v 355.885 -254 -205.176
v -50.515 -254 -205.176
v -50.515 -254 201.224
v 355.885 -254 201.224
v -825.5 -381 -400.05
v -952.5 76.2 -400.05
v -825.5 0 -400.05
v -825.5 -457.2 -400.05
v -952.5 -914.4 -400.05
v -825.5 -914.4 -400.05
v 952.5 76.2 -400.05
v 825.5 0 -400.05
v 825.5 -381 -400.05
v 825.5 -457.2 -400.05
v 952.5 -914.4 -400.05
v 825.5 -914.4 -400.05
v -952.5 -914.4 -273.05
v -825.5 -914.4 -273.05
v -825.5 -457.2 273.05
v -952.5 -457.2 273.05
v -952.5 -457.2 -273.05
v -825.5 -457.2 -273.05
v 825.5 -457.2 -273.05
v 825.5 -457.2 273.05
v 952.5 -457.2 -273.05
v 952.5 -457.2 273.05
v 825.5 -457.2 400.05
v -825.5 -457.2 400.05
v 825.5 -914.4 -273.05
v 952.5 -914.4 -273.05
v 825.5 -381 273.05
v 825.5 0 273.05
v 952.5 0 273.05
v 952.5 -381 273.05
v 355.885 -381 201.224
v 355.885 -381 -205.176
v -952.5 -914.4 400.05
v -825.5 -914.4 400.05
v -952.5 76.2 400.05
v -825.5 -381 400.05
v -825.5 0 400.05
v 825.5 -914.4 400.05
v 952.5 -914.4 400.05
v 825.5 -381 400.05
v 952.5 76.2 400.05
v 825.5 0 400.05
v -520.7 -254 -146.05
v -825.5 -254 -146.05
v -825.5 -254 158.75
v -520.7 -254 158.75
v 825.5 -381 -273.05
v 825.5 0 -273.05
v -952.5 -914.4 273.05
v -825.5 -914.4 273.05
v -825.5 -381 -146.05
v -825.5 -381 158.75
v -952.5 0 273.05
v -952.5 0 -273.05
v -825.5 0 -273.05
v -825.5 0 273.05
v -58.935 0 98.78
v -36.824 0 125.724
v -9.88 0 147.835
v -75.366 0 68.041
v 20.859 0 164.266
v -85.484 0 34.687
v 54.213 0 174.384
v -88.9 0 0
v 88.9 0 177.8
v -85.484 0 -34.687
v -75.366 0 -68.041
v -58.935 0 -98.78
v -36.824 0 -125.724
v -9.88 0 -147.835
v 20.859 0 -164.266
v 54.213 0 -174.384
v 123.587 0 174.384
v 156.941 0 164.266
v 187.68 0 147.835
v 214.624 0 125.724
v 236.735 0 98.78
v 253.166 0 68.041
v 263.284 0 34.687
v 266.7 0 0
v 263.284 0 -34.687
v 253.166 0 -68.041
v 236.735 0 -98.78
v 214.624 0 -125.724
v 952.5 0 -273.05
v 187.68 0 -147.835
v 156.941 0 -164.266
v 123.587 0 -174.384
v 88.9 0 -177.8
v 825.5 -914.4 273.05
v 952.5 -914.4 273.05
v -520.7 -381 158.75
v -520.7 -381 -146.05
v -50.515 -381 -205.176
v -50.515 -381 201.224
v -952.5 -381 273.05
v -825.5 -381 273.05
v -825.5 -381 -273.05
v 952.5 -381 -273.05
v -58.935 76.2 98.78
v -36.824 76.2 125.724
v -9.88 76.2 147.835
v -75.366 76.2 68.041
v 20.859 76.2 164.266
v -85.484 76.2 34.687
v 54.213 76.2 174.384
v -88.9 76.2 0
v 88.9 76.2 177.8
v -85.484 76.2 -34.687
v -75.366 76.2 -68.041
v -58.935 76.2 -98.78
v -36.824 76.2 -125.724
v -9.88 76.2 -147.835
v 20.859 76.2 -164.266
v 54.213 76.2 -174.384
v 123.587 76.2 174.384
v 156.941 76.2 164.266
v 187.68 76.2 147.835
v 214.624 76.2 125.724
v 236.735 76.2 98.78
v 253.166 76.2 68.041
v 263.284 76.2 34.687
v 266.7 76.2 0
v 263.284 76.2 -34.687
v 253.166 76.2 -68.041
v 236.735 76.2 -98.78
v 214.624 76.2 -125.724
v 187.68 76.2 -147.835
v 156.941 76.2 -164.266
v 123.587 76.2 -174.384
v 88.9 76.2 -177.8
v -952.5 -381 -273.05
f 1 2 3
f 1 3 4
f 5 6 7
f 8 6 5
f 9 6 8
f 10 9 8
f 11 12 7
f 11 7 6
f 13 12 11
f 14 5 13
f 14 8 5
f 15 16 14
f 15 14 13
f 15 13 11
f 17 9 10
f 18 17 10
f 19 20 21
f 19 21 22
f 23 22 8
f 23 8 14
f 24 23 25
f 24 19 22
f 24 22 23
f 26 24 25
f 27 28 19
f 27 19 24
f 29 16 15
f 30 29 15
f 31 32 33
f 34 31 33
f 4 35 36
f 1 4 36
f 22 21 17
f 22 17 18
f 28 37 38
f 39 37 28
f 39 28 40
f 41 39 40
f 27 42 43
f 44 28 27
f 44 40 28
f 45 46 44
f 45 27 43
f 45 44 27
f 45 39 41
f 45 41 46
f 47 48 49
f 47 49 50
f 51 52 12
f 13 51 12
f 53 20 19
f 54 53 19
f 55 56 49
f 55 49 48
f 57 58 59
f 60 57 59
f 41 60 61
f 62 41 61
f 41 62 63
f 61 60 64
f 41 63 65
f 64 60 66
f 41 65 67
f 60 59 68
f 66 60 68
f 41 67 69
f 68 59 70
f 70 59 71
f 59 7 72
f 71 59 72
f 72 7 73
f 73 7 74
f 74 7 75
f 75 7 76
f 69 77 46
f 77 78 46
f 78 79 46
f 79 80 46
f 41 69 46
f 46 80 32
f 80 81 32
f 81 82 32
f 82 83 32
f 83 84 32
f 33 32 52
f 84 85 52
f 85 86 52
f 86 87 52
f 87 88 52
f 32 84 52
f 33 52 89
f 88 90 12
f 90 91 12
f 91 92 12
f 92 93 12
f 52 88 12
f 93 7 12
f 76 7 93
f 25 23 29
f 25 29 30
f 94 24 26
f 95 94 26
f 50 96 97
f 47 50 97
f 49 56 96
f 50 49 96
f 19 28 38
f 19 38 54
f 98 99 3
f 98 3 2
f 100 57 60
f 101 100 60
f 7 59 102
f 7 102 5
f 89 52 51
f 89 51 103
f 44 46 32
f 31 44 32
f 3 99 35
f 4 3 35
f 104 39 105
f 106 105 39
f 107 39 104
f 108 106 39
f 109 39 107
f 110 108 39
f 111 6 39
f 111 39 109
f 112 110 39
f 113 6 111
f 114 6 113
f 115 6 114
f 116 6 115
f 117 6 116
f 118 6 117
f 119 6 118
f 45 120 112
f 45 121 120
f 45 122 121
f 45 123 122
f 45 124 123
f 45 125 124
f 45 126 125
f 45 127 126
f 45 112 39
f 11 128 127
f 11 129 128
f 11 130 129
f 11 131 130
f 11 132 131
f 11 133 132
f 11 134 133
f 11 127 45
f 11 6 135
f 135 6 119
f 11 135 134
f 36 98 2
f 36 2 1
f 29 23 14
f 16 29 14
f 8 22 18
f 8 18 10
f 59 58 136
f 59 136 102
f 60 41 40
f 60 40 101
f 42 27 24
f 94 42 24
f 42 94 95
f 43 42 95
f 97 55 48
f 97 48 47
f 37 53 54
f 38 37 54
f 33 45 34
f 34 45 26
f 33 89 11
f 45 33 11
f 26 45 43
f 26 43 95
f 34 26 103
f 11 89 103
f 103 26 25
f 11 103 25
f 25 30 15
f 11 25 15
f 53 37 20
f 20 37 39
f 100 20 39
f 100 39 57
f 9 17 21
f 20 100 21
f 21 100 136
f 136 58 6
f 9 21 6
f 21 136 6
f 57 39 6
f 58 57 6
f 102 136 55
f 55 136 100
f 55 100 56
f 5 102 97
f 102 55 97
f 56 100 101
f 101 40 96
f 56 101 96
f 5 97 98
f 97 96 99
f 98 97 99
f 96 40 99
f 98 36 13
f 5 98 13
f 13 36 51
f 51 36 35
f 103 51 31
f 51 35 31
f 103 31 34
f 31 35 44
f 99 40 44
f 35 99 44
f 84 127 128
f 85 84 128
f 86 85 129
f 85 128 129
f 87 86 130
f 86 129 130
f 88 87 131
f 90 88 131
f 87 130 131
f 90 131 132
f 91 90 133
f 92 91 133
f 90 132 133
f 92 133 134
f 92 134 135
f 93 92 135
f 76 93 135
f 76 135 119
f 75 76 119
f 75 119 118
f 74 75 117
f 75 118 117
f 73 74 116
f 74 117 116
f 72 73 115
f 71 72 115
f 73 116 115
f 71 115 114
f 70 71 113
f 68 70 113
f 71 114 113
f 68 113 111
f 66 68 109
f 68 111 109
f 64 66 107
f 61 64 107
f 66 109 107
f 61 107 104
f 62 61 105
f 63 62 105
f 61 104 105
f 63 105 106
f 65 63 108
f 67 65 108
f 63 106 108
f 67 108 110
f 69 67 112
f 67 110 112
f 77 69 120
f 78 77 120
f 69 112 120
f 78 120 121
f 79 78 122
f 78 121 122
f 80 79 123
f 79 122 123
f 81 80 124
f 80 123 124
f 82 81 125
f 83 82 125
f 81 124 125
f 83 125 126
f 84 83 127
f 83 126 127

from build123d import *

# Parameters (mm, degrees)
SKETCH1_W           = 1905
SKETCH1_H           = 800.1
BOSS_EXTRUDE1_DEPTH = 76.2
BOSS_EXTRUDE2_START = 457.2
SKETCH2_W           = 1905
SKETCH2_H           = 800.1
BOSS_EXTRUDE2_DEPTH = 76.2
SKETCH3_W           = 127
SKETCH3_H           = 127
BOSS_EXTRUDE3_DEPTH = 990.6
SKETCH4_R           = 177.8
CUT_EXTRUDE1_DEPTH  = 76.2
SKETCH5_W           = 406.4
SKETCH5_H           = 406.4
CONTROL_BOX_DEPTH   = 127
SKETCH6_W           = 304.8
SKETCH6_H           = 304.8
SPECTROMETER_DEPTH  = 127


with BuildPart() as part:
    # Sketch1 → Boss-Extrude1 (new body)
    with BuildSketch(Plane(origin=(0, 0, 0), x_dir=(1, 0, 0), z_dir=(0, 1, 0))):
        Rectangle(SKETCH1_W, SKETCH1_H)
    extrude(amount=BOSS_EXTRUDE1_DEPTH)



with BuildPart() as body_2:
    # Sketch2 → Boss-Extrude2 (new body)
    with BuildSketch(Plane.XZ.offset(-76.2).offset(BOSS_EXTRUDE2_START)):
        Rectangle(SKETCH2_W, SKETCH2_H)
    extrude(amount=BOSS_EXTRUDE2_DEPTH)


with BuildPart() as part_1:
    add(part.part)

    add(body_2.part)  # Boss-Extrude3 merges body 2
    # Sketch3 → Boss-Extrude3 (add)
    with BuildSketch(Plane(origin=(0, 76.2, 0), x_dir=(1, 0, 0), z_dir=(0, 1, 0))):
        with Locations((-889, -336.55)):
            Rectangle(SKETCH3_W, SKETCH3_H)
        with Locations((889, 336.55)):
            Rectangle(SKETCH3_W, SKETCH3_H)
        with Locations((-889, 336.55)):
            Rectangle(SKETCH3_W, SKETCH3_H)
        with Locations((889, -336.55)):
            Rectangle(SKETCH3_W, SKETCH3_H)
    extrude(amount=-BOSS_EXTRUDE3_DEPTH)

    # Sketch4 → Cut-Extrude1 (cut)
    with BuildSketch(Plane(origin=(0, 76.2, 0), x_dir=(1, 0, 0), z_dir=(0, 1, 0))):
        with Locations((88.9, 0)):
            Circle(SKETCH4_R)
    extrude(amount=-CUT_EXTRUDE1_DEPTH, mode=Mode.SUBTRACT)

    # Sketch5 → Control Box (add)
    with BuildSketch(Plane(origin=(0, -381, 0), x_dir=(1, 0, 0), z_dir=(0, 1, 0))):
        with Locations((152.685371452, 1.975779164)):
            Rectangle(SKETCH5_W, SKETCH5_H)
    extrude(amount=CONTROL_BOX_DEPTH)

    # Sketch6 → Spectrometer (add)
    with BuildSketch(Plane(origin=(0, -381, 0), x_dir=(1, 0, 0), z_dir=(0, 1, 0))):
        with Locations((-673.1, -6.35)):
            Rectangle(SKETCH6_W, SKETCH6_H)
    extrude(amount=SPECTROMETER_DEPTH)


solid = part_1.part
